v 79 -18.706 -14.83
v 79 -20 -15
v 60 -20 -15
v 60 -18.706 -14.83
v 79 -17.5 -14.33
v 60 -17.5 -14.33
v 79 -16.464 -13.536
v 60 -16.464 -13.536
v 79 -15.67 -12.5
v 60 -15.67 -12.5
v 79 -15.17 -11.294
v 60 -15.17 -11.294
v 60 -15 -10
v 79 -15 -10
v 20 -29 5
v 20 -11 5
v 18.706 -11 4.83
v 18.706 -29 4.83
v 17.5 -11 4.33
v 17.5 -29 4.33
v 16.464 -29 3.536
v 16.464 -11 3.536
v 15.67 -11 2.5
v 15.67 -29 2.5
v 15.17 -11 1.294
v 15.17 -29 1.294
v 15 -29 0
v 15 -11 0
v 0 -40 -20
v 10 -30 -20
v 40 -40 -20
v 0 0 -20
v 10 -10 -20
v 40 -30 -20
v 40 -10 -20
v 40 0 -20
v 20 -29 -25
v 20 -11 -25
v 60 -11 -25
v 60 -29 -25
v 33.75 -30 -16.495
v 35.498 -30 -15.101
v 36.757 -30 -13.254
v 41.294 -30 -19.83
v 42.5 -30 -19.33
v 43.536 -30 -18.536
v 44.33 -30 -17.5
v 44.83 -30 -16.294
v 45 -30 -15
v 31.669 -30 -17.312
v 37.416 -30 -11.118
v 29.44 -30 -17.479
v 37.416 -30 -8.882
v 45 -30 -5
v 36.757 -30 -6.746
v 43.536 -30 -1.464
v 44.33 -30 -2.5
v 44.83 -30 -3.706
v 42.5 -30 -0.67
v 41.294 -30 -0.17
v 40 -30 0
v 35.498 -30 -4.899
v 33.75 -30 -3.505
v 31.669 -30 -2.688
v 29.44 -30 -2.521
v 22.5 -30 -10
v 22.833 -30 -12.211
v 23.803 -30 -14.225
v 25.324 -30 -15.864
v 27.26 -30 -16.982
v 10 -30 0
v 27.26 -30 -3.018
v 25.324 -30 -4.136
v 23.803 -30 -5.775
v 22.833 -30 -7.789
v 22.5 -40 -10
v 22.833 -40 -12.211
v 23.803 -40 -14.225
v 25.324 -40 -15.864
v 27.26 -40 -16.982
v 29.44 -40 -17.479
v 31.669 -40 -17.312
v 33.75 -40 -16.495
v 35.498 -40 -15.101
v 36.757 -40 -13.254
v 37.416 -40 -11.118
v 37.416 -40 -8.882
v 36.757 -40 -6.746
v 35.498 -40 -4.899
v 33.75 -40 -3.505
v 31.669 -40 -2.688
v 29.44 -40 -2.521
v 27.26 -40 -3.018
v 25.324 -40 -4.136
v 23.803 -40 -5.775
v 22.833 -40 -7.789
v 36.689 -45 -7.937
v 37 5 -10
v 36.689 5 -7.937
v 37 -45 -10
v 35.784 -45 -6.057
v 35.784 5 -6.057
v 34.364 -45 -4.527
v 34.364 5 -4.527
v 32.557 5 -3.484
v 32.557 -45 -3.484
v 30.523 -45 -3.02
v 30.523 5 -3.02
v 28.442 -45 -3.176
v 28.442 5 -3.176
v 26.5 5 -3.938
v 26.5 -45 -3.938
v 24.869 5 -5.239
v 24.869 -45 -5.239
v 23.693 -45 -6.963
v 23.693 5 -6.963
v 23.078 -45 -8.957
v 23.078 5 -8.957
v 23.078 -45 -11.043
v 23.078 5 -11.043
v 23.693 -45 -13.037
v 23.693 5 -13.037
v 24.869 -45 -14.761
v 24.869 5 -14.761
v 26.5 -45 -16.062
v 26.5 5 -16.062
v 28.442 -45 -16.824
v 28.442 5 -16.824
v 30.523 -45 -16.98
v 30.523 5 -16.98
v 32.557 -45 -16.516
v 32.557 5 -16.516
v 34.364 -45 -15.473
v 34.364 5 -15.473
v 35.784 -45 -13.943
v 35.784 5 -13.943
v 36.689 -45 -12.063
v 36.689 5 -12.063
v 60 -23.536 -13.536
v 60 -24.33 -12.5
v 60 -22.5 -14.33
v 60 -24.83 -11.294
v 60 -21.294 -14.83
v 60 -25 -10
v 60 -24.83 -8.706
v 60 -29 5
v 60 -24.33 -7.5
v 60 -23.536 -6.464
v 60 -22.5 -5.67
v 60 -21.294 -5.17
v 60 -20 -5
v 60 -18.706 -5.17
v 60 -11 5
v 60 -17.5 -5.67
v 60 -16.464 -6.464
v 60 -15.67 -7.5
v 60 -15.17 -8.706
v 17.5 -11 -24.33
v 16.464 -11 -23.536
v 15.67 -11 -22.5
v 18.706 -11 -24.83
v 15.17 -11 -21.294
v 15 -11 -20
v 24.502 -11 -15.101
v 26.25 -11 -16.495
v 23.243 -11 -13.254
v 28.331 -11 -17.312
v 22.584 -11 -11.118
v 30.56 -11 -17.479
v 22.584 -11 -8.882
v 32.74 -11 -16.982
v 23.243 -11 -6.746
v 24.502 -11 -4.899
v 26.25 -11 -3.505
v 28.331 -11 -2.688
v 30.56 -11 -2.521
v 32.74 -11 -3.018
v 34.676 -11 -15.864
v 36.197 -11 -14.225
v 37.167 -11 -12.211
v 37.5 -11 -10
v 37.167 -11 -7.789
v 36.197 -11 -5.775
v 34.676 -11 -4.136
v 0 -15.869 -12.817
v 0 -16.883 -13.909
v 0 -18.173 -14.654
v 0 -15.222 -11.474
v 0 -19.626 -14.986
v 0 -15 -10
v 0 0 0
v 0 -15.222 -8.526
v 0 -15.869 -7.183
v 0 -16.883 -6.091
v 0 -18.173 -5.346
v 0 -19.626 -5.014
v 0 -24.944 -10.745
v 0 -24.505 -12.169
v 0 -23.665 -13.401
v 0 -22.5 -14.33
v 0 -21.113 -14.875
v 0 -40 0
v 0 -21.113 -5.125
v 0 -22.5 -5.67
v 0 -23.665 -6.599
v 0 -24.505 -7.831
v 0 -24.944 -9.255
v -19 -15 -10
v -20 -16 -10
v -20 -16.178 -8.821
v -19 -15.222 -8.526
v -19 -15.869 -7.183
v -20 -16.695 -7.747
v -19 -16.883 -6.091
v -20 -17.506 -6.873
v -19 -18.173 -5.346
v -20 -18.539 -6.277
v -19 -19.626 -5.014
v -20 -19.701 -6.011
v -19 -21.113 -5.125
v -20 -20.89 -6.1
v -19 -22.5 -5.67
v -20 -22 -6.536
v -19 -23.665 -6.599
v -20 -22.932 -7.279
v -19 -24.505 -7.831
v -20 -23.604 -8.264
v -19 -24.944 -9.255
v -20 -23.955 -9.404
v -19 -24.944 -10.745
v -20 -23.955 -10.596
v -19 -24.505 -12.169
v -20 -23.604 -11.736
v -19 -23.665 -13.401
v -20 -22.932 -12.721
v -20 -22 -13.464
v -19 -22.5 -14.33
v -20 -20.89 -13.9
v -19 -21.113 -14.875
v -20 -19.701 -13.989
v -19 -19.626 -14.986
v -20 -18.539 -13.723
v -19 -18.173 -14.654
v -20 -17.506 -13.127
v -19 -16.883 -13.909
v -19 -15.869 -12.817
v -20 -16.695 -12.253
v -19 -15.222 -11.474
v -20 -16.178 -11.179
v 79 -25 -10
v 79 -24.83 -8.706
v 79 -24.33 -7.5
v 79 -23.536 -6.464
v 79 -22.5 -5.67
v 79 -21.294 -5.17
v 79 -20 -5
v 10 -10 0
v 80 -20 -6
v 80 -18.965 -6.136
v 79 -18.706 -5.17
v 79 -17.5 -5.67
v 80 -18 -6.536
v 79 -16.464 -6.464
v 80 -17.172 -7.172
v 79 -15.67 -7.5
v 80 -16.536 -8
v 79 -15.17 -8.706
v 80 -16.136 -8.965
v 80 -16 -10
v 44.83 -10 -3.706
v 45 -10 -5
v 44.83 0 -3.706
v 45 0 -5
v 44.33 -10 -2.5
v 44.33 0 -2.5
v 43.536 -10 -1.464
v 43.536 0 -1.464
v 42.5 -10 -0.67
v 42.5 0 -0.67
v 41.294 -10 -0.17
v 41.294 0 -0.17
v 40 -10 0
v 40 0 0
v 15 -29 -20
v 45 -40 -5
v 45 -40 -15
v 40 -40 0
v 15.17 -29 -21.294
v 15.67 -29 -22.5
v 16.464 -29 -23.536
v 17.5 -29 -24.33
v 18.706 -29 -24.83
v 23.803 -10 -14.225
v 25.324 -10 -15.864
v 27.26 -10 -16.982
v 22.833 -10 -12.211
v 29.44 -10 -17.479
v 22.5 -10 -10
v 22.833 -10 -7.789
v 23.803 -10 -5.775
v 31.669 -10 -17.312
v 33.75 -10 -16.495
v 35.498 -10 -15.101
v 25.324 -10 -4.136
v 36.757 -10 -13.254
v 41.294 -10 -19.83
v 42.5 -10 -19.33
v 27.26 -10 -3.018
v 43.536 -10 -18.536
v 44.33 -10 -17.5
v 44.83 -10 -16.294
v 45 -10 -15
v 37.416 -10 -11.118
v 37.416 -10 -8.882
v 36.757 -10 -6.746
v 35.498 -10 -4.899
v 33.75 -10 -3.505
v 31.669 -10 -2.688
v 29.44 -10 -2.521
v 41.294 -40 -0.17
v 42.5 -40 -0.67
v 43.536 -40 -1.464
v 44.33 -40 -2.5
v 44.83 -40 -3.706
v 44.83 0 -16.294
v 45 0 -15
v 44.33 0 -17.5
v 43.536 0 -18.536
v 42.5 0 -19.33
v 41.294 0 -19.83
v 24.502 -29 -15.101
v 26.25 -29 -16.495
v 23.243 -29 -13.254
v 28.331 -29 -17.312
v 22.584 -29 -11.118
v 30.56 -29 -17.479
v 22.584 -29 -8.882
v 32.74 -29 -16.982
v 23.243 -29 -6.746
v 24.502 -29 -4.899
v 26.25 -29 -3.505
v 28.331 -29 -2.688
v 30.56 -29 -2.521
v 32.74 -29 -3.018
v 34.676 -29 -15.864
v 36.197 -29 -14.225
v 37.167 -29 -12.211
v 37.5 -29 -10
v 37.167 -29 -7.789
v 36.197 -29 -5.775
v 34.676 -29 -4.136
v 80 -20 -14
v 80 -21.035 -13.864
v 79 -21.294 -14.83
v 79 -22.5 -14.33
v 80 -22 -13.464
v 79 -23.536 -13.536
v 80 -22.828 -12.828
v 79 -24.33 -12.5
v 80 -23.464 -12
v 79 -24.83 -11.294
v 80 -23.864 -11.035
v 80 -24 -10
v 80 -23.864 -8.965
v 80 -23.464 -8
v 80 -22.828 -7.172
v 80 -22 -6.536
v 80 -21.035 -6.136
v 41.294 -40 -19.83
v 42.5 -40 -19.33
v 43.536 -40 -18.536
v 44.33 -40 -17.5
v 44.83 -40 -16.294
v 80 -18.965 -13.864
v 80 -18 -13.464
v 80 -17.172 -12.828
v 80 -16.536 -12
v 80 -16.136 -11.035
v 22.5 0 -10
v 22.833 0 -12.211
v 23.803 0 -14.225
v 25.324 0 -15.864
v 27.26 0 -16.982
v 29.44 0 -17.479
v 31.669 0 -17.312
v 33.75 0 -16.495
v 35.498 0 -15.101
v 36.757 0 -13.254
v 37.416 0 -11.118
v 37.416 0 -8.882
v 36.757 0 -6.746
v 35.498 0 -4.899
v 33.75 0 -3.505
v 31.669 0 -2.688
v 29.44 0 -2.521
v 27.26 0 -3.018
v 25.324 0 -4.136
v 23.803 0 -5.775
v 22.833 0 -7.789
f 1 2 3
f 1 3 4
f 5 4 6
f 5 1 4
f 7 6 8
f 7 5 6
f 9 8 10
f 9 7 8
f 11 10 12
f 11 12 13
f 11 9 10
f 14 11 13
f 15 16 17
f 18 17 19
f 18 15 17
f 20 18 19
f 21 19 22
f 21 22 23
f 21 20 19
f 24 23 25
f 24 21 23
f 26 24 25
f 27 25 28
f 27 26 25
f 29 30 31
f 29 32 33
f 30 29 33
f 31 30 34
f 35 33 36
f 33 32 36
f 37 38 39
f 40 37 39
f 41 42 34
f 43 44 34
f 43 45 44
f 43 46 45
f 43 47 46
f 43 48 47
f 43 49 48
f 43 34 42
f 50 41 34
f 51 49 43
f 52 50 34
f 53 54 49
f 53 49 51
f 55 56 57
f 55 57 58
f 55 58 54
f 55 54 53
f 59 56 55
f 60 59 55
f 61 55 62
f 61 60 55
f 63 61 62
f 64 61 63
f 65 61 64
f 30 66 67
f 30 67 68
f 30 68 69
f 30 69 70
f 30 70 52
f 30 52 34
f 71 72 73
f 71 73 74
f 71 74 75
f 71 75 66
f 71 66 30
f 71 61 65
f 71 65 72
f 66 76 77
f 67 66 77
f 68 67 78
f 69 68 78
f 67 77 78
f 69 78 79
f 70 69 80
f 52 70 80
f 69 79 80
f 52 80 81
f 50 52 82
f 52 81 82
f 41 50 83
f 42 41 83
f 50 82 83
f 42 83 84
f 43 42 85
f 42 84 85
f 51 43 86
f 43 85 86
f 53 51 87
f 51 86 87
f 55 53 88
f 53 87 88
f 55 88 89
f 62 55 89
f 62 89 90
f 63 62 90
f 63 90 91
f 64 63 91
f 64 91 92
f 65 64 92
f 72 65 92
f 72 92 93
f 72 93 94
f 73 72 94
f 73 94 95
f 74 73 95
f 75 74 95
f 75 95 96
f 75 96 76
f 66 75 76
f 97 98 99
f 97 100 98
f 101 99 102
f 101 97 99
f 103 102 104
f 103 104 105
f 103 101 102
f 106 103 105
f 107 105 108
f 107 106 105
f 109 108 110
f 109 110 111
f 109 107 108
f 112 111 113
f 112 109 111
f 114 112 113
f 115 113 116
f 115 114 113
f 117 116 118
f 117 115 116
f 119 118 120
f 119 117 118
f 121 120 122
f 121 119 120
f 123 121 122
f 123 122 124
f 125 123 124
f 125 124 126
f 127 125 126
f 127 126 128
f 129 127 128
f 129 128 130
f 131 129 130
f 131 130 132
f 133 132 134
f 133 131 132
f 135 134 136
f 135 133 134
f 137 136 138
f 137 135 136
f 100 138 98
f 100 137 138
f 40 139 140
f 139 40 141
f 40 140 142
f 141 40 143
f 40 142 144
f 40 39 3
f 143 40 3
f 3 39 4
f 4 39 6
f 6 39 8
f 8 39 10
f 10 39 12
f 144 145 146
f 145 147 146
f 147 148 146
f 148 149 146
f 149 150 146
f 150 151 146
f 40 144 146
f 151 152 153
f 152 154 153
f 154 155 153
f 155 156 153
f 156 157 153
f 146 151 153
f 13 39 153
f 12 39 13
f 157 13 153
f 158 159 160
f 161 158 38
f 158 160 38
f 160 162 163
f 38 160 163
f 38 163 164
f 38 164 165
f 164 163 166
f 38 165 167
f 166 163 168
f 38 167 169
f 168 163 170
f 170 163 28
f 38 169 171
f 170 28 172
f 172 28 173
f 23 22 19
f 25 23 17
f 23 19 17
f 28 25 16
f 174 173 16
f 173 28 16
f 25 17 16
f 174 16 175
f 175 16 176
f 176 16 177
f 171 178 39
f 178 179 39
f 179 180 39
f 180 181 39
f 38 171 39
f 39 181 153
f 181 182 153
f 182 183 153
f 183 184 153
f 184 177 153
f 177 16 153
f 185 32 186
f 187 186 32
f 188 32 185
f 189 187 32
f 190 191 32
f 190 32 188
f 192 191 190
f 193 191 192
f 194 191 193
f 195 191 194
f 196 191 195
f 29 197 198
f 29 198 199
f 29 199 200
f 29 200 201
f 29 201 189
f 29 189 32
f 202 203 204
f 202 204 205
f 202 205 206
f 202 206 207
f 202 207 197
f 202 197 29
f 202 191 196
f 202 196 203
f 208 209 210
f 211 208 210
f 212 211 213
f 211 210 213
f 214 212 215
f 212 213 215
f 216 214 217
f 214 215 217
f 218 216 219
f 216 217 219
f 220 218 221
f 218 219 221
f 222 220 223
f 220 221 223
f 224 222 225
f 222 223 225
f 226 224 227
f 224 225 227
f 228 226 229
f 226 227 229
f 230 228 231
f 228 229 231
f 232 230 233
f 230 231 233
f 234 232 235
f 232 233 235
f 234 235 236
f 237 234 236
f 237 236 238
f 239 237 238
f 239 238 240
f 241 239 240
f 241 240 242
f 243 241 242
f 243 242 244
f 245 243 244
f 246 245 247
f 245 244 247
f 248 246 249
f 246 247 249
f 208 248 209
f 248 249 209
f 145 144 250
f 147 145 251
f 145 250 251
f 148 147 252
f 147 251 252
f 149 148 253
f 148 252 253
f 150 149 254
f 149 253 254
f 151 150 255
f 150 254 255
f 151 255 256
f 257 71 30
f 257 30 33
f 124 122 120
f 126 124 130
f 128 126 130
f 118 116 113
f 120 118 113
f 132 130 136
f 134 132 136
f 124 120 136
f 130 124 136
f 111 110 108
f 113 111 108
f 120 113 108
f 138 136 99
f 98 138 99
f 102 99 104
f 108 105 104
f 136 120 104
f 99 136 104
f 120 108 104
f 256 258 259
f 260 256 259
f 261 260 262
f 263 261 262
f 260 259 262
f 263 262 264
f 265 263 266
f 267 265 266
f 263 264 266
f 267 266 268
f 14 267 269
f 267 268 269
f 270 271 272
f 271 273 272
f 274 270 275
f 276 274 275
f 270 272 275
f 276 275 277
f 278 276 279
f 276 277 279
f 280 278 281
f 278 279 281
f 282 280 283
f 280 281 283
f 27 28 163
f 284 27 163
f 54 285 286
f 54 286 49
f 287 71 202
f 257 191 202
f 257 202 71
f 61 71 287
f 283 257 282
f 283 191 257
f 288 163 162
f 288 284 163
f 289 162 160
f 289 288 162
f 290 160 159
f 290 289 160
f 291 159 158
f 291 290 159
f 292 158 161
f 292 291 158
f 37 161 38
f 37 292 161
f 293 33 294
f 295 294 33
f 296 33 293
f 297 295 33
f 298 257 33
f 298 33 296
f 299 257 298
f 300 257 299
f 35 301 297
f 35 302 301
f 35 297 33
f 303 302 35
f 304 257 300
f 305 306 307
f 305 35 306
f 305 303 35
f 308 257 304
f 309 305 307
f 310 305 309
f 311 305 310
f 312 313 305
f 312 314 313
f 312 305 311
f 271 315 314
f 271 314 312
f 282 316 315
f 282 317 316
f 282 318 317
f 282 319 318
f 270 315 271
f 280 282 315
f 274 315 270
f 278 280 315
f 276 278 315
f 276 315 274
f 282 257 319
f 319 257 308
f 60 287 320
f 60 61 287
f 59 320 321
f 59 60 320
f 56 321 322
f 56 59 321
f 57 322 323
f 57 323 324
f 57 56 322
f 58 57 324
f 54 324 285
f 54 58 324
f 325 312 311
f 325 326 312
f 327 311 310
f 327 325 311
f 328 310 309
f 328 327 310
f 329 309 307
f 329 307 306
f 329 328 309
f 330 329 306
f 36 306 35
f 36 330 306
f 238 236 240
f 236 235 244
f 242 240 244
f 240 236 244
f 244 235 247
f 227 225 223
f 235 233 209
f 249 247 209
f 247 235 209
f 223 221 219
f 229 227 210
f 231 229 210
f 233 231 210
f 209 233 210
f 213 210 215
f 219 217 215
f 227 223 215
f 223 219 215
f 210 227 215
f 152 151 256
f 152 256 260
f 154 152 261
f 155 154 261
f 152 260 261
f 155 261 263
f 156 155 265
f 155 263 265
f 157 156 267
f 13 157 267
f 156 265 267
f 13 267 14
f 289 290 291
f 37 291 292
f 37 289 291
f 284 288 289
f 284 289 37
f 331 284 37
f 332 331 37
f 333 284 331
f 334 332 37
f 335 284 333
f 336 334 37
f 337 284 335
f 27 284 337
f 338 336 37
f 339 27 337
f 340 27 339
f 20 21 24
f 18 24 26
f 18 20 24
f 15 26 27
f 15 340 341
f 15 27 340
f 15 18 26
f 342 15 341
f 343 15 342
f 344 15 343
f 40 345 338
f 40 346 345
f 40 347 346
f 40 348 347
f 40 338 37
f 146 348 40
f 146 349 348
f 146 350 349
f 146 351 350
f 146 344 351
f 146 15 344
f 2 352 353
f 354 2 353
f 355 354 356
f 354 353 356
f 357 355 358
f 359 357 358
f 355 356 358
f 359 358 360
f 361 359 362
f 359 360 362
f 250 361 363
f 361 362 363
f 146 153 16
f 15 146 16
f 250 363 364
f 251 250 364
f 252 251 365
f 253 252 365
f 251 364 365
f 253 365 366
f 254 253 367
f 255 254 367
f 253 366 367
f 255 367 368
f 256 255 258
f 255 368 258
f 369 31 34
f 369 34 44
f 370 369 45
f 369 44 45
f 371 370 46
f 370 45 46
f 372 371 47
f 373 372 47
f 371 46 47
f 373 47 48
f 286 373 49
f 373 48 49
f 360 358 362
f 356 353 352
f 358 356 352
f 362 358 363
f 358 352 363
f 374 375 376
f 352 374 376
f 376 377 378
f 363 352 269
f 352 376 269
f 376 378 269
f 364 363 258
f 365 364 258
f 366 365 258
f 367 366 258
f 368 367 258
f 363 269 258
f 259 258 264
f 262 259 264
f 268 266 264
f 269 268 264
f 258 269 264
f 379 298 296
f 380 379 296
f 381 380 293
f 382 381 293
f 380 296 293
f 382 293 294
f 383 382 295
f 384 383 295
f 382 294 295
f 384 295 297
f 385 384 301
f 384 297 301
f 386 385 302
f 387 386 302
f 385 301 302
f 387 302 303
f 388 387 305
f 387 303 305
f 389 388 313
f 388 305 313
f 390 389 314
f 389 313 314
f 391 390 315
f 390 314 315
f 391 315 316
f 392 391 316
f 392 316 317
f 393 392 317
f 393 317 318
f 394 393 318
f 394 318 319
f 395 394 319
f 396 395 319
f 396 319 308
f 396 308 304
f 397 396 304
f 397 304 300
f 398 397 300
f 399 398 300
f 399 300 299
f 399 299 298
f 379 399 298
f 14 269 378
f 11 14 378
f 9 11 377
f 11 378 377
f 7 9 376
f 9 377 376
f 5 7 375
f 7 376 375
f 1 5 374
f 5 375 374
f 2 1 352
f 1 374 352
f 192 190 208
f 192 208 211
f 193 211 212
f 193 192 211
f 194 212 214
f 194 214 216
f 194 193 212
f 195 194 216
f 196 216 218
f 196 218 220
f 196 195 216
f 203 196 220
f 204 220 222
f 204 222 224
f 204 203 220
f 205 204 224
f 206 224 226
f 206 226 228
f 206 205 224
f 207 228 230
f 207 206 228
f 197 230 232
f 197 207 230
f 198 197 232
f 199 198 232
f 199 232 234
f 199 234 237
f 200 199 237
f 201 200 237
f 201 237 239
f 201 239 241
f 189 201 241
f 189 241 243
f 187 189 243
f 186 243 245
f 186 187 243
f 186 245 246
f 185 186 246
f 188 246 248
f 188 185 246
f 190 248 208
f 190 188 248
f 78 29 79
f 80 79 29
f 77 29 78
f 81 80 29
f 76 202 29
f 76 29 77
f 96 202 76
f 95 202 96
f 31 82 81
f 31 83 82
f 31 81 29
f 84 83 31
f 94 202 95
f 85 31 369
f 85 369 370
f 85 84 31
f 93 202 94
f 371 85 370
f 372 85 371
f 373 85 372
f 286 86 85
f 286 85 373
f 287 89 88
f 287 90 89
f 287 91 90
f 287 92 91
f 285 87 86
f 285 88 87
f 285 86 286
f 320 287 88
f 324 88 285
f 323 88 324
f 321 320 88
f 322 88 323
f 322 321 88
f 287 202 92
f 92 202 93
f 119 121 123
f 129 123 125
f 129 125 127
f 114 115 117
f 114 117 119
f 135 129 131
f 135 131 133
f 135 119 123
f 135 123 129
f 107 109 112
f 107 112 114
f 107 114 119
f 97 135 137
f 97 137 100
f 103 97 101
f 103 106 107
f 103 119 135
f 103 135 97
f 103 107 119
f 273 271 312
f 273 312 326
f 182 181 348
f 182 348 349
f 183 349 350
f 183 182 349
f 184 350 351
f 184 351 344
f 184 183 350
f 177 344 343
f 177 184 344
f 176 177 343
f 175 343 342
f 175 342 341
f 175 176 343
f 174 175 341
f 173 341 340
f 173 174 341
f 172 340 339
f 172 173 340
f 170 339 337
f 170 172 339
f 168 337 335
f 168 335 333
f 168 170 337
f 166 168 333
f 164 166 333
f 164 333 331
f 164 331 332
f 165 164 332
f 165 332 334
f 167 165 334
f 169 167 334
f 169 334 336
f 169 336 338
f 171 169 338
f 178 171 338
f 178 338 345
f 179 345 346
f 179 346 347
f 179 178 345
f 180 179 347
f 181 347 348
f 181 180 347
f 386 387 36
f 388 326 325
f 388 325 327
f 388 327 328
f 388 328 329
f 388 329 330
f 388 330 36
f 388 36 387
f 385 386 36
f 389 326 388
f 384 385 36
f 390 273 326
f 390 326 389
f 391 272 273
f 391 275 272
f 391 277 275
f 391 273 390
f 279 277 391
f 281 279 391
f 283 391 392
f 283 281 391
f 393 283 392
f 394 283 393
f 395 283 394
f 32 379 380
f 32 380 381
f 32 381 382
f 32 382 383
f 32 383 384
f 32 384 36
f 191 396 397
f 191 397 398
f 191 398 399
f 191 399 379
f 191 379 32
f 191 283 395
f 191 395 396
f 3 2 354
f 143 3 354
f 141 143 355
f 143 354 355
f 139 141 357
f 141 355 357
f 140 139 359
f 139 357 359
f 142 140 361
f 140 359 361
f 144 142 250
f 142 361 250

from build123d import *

# Parameters (mm, degrees)
F0_R          = 5
F1_DEPTH      = 20
F3_DEPTH      = 20
F4_R          = 5
F6_D          = 15
F7_SIZE       = 1
F5_R          = 7
F8_DEPTH      = 45
F8_DEPTH_BACK = 5
F9_START      = 11
F5_R_2        = 7.5
F9_DEPTH      = 18
F10_R         = 5
F11_START     = 15
F5_W          = 20
F5_H          = 10
F11_DEPTH     = 10
F12_R         = 4.99999
F13_SIZE      = 1


# Not quite as in the source:
# - a fillet or chamfer is up to 0.001 mm smaller than in the source, because OpenCascade refuses the exact size
# - a feature names something its author has since deleted; it is built from what else it names


with BuildPart() as f1:
    # F0 (on Right) → F1 (new body)
    with BuildSketch(Plane.YZ):
        with Locations((-20, -10)):
            Circle(F0_R)
    extrude(amount=-F1_DEPTH)

    # F2 (on Top) → F3 (join)
    with BuildSketch(Plane.XY):
        Polygon((45, 0), (0, 0), (0, -40), (45, -40), (45, -30), (15, -30), (10, -30), (10, -10), (15, -10), (45, -10), align=None)
    extrude(amount=-F3_DEPTH)

    # F4
    f4_edges = [f1.edges().sort_by_distance(p)[0] for p in [
        (45, -35, 0),
        (45, -5, 0),
        (45, -35, -20),
        (45, -5, -20),
    ]]
    fillet(f4_edges, radius=F4_R)

    # F6 (through all)
    with Locations(Plane(origin=(0, 0, 0), x_dir=(1, 0, 0), z_dir=(0, 1, 0))):
        with Locations((30, 10)):
            Hole(F6_D / 2)

    # F7
    f7_edges = [f1.edges().sort_by_distance(p)[0] for p in [
        (-20, -25, -10),
    ]]
    chamfer(f7_edges, length=F7_SIZE)


with BuildPart() as f8:
    # F5 (on Front) → F8 (new body, two sides)
    with BuildSketch(Plane.XZ) as f8_sk:
        with Locations((30, -10)):
            Circle(F5_R)
    extrude(amount=F8_DEPTH)
    extrude(f8_sk.sketch, amount=-F8_DEPTH_BACK)


with BuildPart() as f9:
    # F5 (on Front) → F9 (new body)
    with BuildSketch(Plane.XZ.offset(F9_START)):
        Polygon((60, 5), (15, 5), (15, -25), (60, -25), (60, -15), (60, -5), align=None)
        with Locations((30, -10)):
            Circle(F5_R_2, mode=Mode.SUBTRACT)
    extrude(amount=F9_DEPTH)

    # F10
    f10_edges = [f9.edges().sort_by_distance(p)[0] for p in [
        (15, -20, 5),
        (15, -20, -25),
    ]]
    fillet(f10_edges, radius=F10_R)

    # F5 (on Front) → F11 (join)
    with BuildSketch(Plane.XZ.offset(F11_START)):
        with Locations((70, -10)):
            Rectangle(F5_W, F5_H)
    extrude(amount=F11_DEPTH)

    # F12 (radius 5 in the source; OpenCascade refuses exactly that, so slightly less here)
    f12_edges = [f9.edges().sort_by_distance(p)[0] for p in [
        (70, -25, -5),
        (70, -15, -5),
        (70, -15, -15),
        (70, -25, -15),
    ]]
    fillet(f12_edges, radius=F12_R)

    # F13
    f13_edges = [f9.edges().sort_by_distance(p)[0] for p in [
        (80, -20, -15),
        (80, -16.464463, -13.535537),
        (80, -23.535537, -13.535537),
        (80, -15, -10),
        (80, -25, -10),
        (80, -16.464463, -6.464463),
        (80, -23.535537, -6.464463),
        (80, -20, -5),
    ]]
    chamfer(f13_edges, length=F13_SIZE)


solid = Compound([f1.part, f8.part, f9.part])
